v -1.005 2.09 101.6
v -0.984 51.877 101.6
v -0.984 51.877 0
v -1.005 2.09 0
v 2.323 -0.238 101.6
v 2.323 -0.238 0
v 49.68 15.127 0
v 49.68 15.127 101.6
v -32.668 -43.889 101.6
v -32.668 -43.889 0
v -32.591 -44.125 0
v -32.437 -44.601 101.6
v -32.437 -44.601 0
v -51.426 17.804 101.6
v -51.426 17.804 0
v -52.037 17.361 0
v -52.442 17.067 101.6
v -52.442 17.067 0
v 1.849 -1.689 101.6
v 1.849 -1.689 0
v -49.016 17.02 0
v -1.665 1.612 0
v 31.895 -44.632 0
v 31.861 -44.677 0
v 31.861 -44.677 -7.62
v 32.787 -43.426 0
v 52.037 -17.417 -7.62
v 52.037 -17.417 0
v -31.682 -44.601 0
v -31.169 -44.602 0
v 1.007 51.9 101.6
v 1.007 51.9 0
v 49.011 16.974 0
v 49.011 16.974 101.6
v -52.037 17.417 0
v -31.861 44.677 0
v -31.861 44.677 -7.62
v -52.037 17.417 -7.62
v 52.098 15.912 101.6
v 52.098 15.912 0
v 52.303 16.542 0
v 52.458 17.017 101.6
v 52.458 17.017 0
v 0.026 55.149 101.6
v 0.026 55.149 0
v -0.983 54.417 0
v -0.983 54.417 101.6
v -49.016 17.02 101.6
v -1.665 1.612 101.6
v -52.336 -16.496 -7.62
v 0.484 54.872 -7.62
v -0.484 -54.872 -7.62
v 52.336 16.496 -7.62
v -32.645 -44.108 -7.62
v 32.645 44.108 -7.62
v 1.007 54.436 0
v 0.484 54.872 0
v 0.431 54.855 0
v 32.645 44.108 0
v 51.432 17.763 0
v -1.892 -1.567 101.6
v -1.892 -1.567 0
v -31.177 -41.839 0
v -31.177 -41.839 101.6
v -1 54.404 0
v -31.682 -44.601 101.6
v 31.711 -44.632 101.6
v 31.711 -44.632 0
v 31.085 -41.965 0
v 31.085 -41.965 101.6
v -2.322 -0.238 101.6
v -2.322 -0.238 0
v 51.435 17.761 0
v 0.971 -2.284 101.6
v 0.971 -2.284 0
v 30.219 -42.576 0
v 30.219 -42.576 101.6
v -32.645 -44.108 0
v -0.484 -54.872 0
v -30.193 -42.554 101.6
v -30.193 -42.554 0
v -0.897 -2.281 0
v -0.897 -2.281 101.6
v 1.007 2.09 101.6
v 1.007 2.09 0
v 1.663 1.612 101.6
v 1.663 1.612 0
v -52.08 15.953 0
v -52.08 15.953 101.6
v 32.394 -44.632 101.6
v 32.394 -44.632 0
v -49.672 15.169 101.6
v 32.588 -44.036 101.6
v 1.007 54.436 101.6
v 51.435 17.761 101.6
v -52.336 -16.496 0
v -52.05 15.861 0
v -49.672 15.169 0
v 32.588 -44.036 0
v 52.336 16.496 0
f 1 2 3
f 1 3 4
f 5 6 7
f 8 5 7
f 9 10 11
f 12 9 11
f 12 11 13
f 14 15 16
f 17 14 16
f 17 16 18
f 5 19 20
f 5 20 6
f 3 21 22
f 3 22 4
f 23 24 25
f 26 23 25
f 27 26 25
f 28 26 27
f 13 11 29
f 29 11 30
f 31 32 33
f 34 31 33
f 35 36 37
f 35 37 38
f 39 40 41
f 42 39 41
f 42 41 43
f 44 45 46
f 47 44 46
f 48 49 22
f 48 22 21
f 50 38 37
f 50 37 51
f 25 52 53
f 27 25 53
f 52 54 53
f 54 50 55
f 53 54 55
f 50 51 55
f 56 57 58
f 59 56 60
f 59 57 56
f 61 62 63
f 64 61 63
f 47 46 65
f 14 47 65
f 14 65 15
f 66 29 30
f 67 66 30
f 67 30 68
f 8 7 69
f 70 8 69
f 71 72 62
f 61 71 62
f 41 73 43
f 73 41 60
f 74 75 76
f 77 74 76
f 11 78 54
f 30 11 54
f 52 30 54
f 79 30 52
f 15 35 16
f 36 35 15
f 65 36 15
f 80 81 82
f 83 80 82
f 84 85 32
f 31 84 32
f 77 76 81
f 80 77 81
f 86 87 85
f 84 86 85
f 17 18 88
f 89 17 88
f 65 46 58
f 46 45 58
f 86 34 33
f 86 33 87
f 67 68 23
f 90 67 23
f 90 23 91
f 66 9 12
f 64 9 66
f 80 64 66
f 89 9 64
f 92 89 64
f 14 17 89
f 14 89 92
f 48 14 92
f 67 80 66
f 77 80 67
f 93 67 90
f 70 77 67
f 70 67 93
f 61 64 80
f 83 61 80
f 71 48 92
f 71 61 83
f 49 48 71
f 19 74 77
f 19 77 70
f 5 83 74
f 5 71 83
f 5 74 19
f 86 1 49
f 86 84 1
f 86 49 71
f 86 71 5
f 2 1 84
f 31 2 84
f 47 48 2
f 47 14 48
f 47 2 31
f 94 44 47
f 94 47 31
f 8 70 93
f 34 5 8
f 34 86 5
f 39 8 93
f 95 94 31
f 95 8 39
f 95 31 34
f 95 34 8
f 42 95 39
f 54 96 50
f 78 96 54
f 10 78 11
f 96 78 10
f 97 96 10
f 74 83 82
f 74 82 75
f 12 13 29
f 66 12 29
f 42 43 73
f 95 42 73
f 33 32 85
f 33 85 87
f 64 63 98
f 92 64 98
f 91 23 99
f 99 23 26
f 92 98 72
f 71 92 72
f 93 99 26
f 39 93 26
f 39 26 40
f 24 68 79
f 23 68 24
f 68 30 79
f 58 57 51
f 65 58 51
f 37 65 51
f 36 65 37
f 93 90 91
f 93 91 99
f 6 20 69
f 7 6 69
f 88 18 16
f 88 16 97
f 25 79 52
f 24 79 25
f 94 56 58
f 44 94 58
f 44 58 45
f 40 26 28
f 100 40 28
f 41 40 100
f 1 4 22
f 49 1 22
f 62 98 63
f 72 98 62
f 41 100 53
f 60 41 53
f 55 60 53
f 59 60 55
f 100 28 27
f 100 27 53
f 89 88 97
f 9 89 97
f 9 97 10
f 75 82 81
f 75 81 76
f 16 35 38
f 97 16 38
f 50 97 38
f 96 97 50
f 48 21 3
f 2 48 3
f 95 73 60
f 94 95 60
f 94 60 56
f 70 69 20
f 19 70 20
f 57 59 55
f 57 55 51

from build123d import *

# Parameters (mm, degrees)
F1_DEPTH = 101.6
F3_DEPTH = 7.62


with BuildPart() as f1:
    # F0 (on Top) → F1 (new body)
    with BuildSketch(Plane.XY):
        Polygon((1.007135, 2.090003), (1.007135, 51.900107), (-0.983909, 51.876503), (-1.0051, 2.090003), (0.00407, 2.820986), align=None)
        Polygon((52.457931, 17.016923), (51.435437, 17.760554), (49.010532, 16.973795), (49.67954, 15.127026), (52.098265, 15.911781), align=None)
        Polygon((-1.665072, 1.611959), (-49.016407, 17.019628), (-49.671557, 15.169454), (-2.321688, -0.237738), (-2.68166, 0.875603), align=None)
        Polygon((-49.016407, 17.019628), (-51.426483, 17.803844), (-52.441647, 17.067025), (-52.080348, 15.953252), (-49.671557, 15.169454), align=None)
        Polygon((49.67954, 15.127026), (49.010532, 16.973795), (1.663114, 1.611959), (2.684175, 0.867862), (2.323179, -0.237738), align=None)
        Polygon((1.663114, 1.611959), (1.007135, 2.090003), (0.00407, 2.820986), (-1.0051, 2.090003), (-1.665072, 1.611959), (-2.68166, 0.875603), (-2.321688, -0.237738), (-1.891828, -1.567235), (-1.661426, -2.279834), (-0.896572, -2.280937), (0.970708, -2.283631), (1.654842, -2.284618), (1.849318, -1.689005), (2.323179, -0.237738), (2.684175, 0.867862), align=None)
        Polygon((-0.983909, 51.876503), (-0.982828, 54.416503), (-51.426483, 17.803844), (-49.016407, 17.019628), align=None)
        Polygon((51.435437, 17.760554), (1.007135, 54.435669), (1.007135, 51.900107), (49.010532, 16.973795), align=None)
        Polygon((31.710784, -44.631538), (30.218665, -42.575976), (-30.193032, -42.554206), (-31.682195, -44.601329), align=None)
        Polygon((30.218665, -42.575976), (31.085375, -41.964973), (1.849318, -1.689005), (1.654842, -2.284618), (0.970708, -2.283631), align=None)
        Polygon((32.588472, -44.035659), (52.098265, 15.911781), (49.67954, 15.127026), (31.085375, -41.964973), align=None)
        Polygon((-49.671557, 15.169454), (-52.080348, 15.953252), (-32.667992, -43.889094), (-31.17694, -41.838673), align=None)
        Polygon((-1.891828, -1.567235), (-31.17694, -41.838673), (-30.193032, -42.554206), (-0.896572, -2.280937), (-1.661426, -2.279834), align=None)
        Polygon((1.007135, 54.435669), (0.026342, 55.148972), (-0.982828, 54.416503), (-0.983909, 51.876503), (1.007135, 51.900107), align=None)
        Polygon((-31.17694, -41.838673), (-32.667992, -43.889094), (-32.437065, -44.600969), (-31.682195, -44.601329), (-30.193032, -42.554206), align=None)
        Polygon((32.394438, -44.631864), (32.588472, -44.035659), (31.085375, -41.964973), (30.218665, -42.575976), (31.710784, -44.631538), align=None)
    extrude(amount=F1_DEPTH)

    # F2 (on Top) → F3 (join)
    with BuildSketch(Plane.XY):
        Polygon((-0.484477, -54.871911), (31.86095, -44.677077), (52.036577, -17.417118), (52.336, 16.495588), (32.64485, 44.10754), (0.484477, 54.871911), (-31.86095, 44.677077), (-52.036577, 17.417118), (-52.336, -16.495588), (-32.64485, -44.10754), align=None)
    extrude(amount=-F3_DEPTH)


solid = f1.part
